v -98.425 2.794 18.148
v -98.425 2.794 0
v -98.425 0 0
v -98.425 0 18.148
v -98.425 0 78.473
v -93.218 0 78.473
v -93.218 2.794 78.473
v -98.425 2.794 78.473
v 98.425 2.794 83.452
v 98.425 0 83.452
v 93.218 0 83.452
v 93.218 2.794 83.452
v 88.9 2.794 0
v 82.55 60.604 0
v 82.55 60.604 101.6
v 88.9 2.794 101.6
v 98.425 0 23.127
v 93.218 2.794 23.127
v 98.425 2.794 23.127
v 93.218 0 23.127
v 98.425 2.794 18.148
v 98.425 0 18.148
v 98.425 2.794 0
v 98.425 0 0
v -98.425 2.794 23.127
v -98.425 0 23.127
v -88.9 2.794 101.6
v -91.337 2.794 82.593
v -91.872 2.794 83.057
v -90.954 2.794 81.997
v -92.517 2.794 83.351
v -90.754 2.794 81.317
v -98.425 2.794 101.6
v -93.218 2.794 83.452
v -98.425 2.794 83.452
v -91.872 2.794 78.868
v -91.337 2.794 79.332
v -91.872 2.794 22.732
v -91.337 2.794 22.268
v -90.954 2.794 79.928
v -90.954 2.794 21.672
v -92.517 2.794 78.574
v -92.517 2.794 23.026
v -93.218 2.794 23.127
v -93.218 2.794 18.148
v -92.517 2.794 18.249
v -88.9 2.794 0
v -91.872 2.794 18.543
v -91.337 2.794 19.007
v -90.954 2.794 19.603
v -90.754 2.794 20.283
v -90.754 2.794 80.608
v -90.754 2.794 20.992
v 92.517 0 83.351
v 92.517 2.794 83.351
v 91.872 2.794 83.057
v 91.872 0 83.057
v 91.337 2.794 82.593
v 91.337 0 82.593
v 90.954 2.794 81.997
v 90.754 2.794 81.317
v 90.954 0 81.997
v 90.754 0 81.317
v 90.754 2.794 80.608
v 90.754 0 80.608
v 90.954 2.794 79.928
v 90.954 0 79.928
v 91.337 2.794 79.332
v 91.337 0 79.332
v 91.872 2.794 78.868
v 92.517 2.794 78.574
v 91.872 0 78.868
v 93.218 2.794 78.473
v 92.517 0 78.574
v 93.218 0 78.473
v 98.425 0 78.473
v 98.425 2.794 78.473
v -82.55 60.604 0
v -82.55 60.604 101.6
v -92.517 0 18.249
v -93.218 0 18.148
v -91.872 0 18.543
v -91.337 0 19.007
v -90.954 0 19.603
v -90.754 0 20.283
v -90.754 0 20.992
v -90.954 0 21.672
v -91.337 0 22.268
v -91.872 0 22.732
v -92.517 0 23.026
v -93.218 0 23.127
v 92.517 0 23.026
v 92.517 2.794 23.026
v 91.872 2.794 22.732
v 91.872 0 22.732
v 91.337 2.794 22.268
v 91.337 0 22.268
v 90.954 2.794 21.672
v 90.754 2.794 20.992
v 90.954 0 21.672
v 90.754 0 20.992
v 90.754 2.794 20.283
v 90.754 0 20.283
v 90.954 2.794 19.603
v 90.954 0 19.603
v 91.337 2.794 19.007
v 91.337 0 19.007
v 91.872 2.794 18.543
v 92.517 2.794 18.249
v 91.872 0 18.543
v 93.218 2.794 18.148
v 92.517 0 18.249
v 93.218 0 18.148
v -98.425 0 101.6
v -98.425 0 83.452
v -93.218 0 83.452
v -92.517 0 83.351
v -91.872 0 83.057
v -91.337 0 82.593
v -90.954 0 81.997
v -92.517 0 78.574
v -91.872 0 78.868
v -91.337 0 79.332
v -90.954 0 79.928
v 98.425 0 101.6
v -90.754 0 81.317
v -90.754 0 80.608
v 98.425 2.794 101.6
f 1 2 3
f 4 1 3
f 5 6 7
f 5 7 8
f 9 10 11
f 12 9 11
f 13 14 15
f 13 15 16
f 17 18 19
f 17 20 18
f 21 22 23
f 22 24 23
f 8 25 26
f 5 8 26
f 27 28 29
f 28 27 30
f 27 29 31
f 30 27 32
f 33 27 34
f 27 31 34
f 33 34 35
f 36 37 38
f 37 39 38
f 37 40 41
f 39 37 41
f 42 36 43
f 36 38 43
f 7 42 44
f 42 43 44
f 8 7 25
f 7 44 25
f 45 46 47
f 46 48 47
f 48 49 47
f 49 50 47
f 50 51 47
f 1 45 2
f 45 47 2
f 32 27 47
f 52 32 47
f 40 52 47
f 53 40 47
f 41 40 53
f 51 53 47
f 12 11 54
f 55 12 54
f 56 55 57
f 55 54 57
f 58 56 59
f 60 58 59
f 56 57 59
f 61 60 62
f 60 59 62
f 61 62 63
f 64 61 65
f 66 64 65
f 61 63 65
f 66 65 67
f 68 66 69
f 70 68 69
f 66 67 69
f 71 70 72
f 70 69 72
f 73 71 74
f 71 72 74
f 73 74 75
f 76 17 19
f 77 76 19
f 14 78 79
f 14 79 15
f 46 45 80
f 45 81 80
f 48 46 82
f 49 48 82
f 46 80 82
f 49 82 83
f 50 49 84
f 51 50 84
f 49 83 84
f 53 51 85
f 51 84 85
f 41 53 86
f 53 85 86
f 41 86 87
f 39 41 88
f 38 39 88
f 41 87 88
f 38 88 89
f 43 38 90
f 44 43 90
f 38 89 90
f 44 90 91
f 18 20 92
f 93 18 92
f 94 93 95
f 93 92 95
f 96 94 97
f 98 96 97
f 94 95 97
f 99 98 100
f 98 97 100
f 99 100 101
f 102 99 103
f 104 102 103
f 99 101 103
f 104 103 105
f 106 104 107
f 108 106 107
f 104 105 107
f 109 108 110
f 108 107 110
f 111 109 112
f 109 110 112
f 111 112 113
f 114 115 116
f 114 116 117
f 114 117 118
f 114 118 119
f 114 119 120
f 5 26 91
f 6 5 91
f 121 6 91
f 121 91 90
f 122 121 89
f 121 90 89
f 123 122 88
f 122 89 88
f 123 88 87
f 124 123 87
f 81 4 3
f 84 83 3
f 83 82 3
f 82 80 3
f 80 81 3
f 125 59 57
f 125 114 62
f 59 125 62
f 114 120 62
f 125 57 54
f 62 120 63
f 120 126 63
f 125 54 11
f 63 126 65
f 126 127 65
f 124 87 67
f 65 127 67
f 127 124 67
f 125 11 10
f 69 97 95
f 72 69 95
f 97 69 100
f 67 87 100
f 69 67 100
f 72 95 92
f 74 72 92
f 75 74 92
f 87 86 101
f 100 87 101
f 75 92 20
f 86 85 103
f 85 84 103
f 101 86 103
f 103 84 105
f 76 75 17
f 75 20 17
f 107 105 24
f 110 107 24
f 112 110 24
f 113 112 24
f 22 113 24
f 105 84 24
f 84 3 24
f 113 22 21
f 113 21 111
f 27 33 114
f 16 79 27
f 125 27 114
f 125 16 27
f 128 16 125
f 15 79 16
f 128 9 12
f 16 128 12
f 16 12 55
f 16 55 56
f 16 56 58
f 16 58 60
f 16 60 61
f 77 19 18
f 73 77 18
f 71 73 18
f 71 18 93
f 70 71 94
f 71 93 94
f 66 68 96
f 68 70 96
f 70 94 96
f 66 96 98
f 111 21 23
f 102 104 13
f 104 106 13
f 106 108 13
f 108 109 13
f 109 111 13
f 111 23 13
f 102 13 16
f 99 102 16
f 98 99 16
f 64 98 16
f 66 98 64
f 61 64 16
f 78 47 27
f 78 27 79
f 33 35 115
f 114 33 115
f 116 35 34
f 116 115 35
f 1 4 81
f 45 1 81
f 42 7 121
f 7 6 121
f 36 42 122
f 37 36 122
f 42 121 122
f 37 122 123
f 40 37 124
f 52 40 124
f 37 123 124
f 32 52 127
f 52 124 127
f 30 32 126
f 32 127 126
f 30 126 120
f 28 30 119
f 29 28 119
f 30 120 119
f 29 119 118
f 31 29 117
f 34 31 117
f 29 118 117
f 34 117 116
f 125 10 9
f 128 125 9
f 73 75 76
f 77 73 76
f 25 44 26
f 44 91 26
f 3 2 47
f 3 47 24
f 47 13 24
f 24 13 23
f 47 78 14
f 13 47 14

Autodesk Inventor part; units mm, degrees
ref_plane "YZ Plane" through (0, 0, 0) normal (1, 0, 0) x (0, 1, 0)
ref_plane "XZ Plane" through (0, 0, 0) normal (0, 1, 0) x (-1, 0, 0)
ref_plane "XY Plane" through (0, 0, 0) normal (0, 0, 1) x (1, 0, 0)
sketch "Sketch1" plane through (0, 0, 0) normal (0, 0, 1) x (1, 0, 0)
  line L0 (-98.425, 0) -> (98.425, 0)
  line L1 (98.425, 0) -> (98.425, 2.794)
  line L2 (98.425, 2.794) -> (-98.425, 2.794)
  line L3 (-98.425, 2.794) -> (-98.425, 0)
  line L4 (-88.9, 2.794) -> (-82.55, 60.6044)
  line L5 (-82.55, 60.6044) -> (82.55, 60.6044)
  line L6 (82.55, 60.6044) -> (88.9, 2.794)
  point P0 (0, 0)
  point P1 (0, 0)
  point P2 (0, 2.794)
  point P3 (0, 60.6044)
  dimension "d0" = 196.85
  dimension "d1" = 177.8
  dimension "d2" = 165.1
  dimension "d3" = 2.794
  dimension "d4" = 60.6044
extrude "Extrusion1" add sketch "Sketch1" along normal blind 101.6
sketch "Sketch2" plane through (-98.425, 0, 0) normal (0, -1, 0) x (1, 0, 0)
  line L0 (196.85, 101.6) -> (0, 101.6) projected
  line L1 (0, 0) -> (0, 101.6) projected
  line L2 (196.85, 0) -> (196.85, 101.6) projected
  line L3 (0, 83.4517) -> (5.207, 83.4517)
  line L4 (5.207, 83.4517) -> (5.207, 78.4733)
  line L5 (5.207, 78.4733) -> (0, 78.4733)
  line L6 (0, 78.4733) -> (0, 83.4517)
  circle A0 centre (5.207, 80.9625) radius 2.4892
  line L7 (0, 50.8) -> (196.85, 50.8)
  line L8 (98.425, 101.6) -> (98.425, 0)
  line L9 (0, 18.1483) -> (5.207, 18.1483)
  line L10 (5.207, 18.1483) -> (5.207, 23.1267)
  line L11 (5.207, 23.1267) -> (0, 23.1267)
  line L12 (0, 23.1267) -> (0, 18.1483)
  circle A1 centre (5.207, 20.6375) radius 2.4892
  line L13 (196.85, 83.4517) -> (191.643, 83.4517)
  line L14 (191.643, 83.4517) -> (191.643, 78.4733)
  line L15 (191.643, 78.4733) -> (196.85, 78.4733)
  line L16 (196.85, 78.4733) -> (196.85, 83.4517)
  circle A2 centre (191.643, 80.9625) radius 2.4892
  line L17 (196.85, 18.1483) -> (191.643, 18.1483)
  line L18 (191.643, 18.1483) -> (191.643, 23.1267)
  line L19 (191.643, 23.1267) -> (196.85, 23.1267)
  line L20 (196.85, 23.1267) -> (196.85, 18.1483)
  circle A3 centre (191.643, 20.6375) radius 2.4892
  dimension "d7" = 4.9784
  dimension "d8" = 5.207
  dimension "d9" = 30.1625
extrude "Extrusion2" cut sketch "Sketch2" against normal up to next contours L2 L17 A3 L19 | L11 A1 L9 L1 | L2 L15 A2 L13 | A2 L14 | L14 A2 | L3 A0 L5 L1 | A0 L4 | L4 A0 | A1 L10 | L10 A1 | A3 L18 | L18 A3
properties part number "supply-13.8"
